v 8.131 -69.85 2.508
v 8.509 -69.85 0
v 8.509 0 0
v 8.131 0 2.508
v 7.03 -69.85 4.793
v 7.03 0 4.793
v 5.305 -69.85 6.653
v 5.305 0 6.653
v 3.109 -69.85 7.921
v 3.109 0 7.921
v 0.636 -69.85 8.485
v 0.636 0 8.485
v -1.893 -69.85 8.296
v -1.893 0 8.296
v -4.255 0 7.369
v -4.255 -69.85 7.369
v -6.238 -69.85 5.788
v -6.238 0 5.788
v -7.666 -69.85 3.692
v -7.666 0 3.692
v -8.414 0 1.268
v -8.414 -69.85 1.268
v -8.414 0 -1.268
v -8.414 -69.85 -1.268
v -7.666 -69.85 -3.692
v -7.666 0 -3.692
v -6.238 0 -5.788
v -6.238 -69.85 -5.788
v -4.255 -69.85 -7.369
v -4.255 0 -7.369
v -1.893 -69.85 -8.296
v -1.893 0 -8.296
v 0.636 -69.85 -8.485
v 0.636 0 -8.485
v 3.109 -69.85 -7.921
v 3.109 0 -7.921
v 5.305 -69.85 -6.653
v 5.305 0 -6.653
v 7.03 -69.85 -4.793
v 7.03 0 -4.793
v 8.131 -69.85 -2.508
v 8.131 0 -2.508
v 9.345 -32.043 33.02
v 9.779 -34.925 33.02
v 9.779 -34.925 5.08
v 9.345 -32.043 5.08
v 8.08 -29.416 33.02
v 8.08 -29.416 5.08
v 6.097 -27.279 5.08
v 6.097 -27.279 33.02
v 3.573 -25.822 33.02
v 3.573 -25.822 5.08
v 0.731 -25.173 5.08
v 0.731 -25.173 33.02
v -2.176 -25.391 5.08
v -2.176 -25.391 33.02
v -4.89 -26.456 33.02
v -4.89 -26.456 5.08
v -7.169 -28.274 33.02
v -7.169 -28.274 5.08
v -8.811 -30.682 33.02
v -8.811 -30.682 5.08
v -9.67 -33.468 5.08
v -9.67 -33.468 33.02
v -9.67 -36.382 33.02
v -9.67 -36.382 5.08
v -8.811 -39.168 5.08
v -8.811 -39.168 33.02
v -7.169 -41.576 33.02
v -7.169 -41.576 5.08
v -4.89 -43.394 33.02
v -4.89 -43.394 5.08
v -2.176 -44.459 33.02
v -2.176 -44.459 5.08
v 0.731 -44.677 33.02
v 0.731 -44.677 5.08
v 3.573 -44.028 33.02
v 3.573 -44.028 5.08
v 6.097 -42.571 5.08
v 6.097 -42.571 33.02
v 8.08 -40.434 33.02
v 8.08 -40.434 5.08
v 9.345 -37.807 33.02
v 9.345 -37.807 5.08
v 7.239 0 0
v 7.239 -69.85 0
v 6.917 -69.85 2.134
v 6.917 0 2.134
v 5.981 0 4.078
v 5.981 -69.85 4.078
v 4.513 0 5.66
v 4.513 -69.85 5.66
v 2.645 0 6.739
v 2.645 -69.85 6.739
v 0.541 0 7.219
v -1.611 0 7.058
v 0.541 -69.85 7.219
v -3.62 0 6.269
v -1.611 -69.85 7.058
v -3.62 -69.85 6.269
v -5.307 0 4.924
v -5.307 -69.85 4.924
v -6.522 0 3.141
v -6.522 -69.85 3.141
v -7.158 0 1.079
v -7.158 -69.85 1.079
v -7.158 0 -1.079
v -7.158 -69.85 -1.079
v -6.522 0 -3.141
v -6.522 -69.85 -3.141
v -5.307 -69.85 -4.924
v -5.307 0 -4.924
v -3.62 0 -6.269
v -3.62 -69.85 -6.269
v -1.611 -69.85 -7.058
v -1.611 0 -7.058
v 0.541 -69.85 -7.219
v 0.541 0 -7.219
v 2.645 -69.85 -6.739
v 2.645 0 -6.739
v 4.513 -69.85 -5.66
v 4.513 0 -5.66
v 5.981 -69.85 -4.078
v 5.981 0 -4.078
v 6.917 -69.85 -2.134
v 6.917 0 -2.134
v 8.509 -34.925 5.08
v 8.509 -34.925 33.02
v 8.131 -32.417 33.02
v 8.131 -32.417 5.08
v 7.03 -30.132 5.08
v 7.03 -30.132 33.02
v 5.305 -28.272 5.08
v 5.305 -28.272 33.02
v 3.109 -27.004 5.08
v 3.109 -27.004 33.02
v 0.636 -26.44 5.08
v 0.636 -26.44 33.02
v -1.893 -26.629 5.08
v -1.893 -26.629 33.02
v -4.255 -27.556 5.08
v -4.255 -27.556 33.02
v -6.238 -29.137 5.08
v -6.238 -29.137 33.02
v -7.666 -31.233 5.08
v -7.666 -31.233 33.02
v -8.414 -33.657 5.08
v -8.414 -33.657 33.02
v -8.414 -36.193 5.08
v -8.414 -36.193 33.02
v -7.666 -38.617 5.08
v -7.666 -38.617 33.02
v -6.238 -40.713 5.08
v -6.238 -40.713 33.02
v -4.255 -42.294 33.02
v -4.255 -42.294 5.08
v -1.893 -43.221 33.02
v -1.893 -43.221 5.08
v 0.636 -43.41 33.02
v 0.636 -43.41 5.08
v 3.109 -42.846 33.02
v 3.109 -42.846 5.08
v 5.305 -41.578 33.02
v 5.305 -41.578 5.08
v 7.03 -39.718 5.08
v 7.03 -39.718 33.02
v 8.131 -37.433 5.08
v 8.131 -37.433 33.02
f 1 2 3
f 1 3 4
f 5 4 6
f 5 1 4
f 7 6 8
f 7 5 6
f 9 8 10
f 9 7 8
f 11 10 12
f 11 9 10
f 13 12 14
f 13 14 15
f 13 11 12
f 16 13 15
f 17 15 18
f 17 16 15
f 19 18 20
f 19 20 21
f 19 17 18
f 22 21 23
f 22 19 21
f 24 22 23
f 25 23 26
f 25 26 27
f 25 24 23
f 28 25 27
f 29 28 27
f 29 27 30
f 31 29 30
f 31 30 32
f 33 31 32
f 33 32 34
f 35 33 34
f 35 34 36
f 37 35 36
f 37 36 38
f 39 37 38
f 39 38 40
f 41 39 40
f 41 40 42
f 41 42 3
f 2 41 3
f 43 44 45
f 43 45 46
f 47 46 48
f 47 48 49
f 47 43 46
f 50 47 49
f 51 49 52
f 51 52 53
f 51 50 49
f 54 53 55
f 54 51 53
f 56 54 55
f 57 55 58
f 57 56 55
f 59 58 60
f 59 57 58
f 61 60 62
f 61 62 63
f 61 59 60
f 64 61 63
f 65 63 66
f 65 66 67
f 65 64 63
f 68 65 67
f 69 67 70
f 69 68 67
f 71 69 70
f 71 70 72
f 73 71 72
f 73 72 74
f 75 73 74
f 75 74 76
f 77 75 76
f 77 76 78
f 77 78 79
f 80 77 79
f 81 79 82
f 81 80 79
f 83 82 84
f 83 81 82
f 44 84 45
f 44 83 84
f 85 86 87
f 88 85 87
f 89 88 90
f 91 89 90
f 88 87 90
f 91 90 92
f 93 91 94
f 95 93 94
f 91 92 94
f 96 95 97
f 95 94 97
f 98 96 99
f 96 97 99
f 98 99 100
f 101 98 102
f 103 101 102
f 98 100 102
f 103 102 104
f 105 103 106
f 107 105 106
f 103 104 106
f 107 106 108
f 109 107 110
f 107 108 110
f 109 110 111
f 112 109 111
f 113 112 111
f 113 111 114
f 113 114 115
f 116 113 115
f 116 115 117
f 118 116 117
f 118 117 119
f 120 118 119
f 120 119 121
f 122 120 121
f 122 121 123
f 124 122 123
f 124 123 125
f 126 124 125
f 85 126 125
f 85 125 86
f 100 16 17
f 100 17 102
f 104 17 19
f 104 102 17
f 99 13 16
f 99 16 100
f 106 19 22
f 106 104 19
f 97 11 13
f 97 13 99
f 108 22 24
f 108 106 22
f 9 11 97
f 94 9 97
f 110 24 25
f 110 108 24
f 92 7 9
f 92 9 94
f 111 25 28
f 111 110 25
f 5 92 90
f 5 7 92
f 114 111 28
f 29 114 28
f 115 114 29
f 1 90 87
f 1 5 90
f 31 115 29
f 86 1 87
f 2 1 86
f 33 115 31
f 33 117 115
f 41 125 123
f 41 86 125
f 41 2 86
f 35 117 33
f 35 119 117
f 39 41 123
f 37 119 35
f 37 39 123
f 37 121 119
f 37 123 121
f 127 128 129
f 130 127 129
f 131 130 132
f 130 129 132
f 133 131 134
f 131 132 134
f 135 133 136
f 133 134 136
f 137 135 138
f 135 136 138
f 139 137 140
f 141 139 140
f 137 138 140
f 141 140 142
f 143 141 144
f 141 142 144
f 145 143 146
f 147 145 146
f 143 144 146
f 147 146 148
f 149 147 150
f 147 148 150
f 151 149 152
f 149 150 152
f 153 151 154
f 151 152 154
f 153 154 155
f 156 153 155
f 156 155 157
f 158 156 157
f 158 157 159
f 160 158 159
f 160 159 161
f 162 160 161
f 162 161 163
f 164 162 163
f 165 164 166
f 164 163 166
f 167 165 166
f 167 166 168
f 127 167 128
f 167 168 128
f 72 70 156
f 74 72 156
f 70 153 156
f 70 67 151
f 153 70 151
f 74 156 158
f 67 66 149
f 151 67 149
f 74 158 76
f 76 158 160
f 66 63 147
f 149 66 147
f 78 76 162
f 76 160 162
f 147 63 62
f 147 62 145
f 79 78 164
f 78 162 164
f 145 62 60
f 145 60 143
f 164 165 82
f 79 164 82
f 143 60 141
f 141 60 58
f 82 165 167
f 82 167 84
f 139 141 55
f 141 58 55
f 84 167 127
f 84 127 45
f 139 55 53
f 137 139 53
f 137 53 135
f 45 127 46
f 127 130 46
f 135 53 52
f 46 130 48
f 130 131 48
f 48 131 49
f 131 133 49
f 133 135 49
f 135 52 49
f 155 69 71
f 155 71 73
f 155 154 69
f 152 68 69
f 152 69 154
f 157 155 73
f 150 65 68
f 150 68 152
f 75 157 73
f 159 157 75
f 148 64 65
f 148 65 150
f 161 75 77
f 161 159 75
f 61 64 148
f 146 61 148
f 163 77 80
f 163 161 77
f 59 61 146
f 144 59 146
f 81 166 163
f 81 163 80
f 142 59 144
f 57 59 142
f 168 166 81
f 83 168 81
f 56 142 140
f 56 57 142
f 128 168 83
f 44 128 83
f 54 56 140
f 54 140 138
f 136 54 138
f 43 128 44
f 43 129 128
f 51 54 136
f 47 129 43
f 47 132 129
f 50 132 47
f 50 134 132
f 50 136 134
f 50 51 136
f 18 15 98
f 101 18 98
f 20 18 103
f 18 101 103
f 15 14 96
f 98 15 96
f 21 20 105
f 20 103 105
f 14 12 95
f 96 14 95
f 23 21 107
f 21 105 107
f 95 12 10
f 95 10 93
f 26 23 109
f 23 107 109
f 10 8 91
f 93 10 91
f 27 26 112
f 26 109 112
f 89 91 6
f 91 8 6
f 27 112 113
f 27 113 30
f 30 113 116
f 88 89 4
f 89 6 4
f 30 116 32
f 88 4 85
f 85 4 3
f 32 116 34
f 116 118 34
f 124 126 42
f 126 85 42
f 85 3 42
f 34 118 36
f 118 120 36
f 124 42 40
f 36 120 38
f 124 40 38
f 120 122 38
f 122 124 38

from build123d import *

# Parameters (mm, degrees)
F0_R          = 8.509
F0_R_2        = 7.239
F3_R          = 9.779
F3_R_2        = 8.509
F6_DEPTH      = 20.828
F6_DEPTH_BACK = 5.08
F7_DEPTH      = 5.08


# Not quite as in the source:
# - a feature names something its author has since deleted; it is built from what else it names


with BuildPart() as f2:
    # F2: sweep along a path in F1
    with BuildLine(Plane.YZ) as f2_path:
        Line((0, 0), (-69.85, 0))
    # F0 (on Front) → F2 (sweep)
    with BuildSketch(Plane.XZ):
        Circle(F0_R)
        Circle(F0_R_2, mode=Mode.SUBTRACT)
    sweep(path=f2_path.line)


with BuildPart() as f5:
    # F5: sweep along a path in F4
    with BuildLine(Plane.YZ) as f5_path:
        Line((-34.925, 0), (-34.925, 38.1))
    # F3 (on Top) → F5 (sweep)
    with BuildSketch(Plane.XY):
        with Locations((0, -34.925)):
            Circle(F3_R)
        with Locations((0, -34.925)):
            Circle(F3_R_2, mode=Mode.SUBTRACT)
    sweep(path=f5_path.line)

    # F6 (cut, two sides): a face of the model
    f6_faces = [f5.faces().sort_by_distance(p)[0] for p in [
        (-9.5024081115, -34.925, 0),
    ]]
    extrude(f6_faces, amount=F6_DEPTH, mode=Mode.SUBTRACT)
    extrude(f6_faces, amount=-F6_DEPTH_BACK, mode=Mode.SUBTRACT)

    # F7 (cut): a face of the model
    f7_faces = [f5.faces().sort_by_distance(p)[0] for p in [
        (-9.5024081115, -34.925, 38.1),
    ]]
    extrude(f7_faces, amount=-F7_DEPTH, mode=Mode.SUBTRACT)


solid = Compound([f2.part, f5.part])
